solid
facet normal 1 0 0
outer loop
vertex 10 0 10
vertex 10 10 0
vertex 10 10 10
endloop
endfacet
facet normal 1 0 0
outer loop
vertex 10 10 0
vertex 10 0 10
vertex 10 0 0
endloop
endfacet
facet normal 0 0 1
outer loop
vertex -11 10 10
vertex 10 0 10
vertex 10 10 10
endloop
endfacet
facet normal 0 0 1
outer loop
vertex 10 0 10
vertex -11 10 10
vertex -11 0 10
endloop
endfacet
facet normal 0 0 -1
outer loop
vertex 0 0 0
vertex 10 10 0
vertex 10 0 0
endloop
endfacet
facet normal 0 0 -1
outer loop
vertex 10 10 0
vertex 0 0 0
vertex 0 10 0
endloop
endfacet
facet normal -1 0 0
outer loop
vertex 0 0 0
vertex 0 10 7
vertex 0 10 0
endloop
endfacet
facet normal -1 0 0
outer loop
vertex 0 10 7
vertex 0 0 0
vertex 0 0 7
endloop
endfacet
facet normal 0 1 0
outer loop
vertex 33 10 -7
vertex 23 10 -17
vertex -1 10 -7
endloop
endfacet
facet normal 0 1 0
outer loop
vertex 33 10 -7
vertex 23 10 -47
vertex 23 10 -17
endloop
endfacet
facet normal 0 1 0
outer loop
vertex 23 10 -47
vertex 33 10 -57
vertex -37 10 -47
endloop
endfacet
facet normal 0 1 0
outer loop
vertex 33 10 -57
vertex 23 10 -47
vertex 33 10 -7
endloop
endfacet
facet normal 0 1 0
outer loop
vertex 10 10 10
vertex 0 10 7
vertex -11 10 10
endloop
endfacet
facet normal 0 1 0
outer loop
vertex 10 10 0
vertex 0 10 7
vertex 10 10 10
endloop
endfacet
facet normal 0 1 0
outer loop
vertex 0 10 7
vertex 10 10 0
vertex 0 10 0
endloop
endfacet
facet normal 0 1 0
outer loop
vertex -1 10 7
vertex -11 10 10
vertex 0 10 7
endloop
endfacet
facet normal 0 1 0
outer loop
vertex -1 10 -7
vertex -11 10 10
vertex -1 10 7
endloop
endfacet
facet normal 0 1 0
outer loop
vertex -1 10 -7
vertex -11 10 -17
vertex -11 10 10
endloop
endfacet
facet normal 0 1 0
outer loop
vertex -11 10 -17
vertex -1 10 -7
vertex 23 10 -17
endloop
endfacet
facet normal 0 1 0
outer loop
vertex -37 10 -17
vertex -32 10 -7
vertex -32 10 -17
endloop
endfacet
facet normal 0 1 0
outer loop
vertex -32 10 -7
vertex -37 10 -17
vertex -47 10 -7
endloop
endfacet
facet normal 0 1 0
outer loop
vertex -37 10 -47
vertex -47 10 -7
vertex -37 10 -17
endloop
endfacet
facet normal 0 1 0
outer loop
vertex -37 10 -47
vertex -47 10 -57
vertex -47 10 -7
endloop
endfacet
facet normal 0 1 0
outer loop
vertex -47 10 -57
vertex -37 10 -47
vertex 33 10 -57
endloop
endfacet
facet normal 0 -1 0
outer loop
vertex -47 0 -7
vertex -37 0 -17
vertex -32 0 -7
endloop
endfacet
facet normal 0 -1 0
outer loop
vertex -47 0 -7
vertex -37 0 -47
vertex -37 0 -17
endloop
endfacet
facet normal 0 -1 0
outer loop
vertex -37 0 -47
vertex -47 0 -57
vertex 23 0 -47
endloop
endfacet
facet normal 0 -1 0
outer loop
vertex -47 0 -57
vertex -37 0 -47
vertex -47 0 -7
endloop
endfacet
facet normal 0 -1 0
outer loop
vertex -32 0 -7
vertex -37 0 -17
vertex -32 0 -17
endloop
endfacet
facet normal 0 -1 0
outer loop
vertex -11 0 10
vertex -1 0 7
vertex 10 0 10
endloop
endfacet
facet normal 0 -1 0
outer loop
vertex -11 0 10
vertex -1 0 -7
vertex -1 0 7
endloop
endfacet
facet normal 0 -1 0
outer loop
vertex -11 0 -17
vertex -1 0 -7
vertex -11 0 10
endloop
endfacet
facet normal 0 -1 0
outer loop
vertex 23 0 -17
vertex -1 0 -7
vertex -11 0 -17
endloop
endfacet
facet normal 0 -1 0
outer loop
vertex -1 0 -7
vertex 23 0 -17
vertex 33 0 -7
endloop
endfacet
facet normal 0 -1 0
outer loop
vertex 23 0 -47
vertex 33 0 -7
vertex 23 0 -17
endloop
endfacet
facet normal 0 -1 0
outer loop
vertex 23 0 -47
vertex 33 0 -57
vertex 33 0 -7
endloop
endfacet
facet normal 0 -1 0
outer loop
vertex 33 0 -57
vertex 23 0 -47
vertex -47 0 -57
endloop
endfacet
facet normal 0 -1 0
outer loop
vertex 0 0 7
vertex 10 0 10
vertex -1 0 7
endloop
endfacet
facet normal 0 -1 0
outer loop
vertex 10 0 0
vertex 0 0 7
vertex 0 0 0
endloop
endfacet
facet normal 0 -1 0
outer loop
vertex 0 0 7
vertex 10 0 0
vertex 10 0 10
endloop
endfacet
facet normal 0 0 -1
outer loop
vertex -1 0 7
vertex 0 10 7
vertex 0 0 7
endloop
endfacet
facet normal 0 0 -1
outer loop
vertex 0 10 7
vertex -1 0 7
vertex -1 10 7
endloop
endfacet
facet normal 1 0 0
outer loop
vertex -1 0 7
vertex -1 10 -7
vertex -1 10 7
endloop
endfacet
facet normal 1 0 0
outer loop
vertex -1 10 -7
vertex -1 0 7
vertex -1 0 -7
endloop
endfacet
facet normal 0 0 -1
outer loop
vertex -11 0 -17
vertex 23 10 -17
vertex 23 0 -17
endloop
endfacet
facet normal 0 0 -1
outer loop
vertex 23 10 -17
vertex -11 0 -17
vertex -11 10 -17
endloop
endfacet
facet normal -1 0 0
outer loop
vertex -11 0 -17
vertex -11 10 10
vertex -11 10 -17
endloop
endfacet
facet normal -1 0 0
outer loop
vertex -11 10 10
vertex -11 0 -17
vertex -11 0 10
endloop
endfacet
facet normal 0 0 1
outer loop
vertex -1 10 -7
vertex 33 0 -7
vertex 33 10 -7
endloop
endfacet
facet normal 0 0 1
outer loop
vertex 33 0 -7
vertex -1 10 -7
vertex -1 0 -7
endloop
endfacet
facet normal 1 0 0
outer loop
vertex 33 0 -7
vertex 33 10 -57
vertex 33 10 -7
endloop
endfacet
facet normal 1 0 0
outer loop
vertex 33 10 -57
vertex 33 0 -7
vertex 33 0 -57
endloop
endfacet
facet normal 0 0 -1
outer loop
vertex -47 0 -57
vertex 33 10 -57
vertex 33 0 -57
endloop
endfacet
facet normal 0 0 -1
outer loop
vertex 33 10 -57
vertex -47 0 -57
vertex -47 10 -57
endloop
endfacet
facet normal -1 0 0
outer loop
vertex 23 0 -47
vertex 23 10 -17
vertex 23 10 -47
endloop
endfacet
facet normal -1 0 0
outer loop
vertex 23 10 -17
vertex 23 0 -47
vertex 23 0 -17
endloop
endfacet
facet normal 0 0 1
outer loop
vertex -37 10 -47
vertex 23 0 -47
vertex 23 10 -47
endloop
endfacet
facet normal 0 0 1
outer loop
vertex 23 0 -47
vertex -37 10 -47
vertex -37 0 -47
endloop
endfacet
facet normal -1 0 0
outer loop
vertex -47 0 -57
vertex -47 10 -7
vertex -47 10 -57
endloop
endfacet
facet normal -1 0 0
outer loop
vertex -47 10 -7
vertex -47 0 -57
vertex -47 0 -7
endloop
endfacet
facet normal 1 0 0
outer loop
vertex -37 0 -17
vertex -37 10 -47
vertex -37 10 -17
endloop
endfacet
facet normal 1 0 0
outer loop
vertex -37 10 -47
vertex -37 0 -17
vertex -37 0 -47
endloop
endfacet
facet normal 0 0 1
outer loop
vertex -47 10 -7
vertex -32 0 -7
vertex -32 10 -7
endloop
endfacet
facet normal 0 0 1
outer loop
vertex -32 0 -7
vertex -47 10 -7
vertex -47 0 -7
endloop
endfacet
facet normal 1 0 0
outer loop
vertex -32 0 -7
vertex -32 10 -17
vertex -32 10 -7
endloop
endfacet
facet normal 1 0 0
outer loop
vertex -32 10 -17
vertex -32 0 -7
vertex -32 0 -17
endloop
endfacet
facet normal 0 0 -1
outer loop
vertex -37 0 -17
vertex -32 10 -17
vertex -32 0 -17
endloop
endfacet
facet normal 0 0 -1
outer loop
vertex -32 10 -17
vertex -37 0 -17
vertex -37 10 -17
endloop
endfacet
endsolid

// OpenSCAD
// dimensions
width=10;
height=50;
depth=80;
back=33;
wall=10;
trap=5;

// fixed
SPACER=1;
OPENING=7;

// catch
cube([10,width,10]);

// spacer
translate([-SPACER,0,OPENING]) {
  cube([SPACER,width,10-OPENING]);
}

//  line
translate([-wall-SPACER,0,-wall-OPENING]) {
   cube([wall,width,wall+OPENING+10]);
}

// support
translate([-SPACER,0,-wall-OPENING]) {
  cube([back,width,wall]);
}

// back
translate([back-wall,0,-height-OPENING]) {
  cube([wall,width,height]);
}

// bottom
translate([-depth+back,0,-height-7]) {
  cube([depth,width,wall]);
}

// front
translate([-depth+back,0,-height-OPENING]) {
  cube([wall,width,height]);
}

// trap
translate([-depth+back+wall,0,-wall-OPENING]) {
  cube([trap,width,wall]);
} 
